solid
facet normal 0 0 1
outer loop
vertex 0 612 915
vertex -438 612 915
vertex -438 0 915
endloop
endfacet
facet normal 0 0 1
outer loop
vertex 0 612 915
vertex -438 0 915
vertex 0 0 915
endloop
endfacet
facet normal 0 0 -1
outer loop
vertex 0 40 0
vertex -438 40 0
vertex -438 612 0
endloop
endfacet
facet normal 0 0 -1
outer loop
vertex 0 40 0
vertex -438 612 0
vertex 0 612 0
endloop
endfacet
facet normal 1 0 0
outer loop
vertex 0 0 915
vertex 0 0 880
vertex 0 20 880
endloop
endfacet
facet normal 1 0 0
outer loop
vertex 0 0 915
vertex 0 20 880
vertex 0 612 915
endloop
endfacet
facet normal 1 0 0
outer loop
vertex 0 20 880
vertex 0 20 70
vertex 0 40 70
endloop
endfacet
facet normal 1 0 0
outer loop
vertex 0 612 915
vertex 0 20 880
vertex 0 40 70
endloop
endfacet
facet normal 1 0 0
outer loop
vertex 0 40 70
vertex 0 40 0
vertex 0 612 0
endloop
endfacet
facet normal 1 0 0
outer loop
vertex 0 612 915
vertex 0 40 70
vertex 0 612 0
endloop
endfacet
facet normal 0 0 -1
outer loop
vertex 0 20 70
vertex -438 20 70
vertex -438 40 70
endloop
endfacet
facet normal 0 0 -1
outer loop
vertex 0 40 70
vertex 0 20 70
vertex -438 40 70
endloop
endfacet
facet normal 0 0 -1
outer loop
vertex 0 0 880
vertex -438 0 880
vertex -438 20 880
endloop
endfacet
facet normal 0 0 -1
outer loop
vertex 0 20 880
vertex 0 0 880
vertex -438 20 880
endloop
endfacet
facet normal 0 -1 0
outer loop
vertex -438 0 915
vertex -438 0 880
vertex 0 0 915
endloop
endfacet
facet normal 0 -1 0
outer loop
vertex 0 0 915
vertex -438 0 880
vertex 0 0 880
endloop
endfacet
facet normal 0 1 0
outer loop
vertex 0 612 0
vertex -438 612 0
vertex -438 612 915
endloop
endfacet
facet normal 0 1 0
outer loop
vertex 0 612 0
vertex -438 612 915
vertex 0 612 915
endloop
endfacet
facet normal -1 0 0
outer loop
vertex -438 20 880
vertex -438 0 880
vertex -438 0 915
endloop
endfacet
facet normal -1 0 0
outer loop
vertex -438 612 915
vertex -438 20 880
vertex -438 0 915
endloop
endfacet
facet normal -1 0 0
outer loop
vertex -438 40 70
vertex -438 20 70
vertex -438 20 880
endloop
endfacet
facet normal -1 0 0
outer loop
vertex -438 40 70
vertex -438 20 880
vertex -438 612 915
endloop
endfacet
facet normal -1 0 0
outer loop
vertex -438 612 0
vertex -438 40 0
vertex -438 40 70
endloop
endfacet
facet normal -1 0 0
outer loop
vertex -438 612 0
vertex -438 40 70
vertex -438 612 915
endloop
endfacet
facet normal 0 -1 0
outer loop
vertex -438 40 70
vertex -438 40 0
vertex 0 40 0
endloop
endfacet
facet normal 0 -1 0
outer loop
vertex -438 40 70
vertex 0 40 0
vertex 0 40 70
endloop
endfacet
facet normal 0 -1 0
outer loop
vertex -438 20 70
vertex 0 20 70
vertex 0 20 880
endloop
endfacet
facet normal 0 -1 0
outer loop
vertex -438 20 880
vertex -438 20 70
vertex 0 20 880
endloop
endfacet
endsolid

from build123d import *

# Parameters (mm, degrees)
F0_W     = 438
F0_H     = 612
F1_DEPTH = 915
F2_W     = 20
F2_H     = 880
F3_DEPTH = 438.001
F4_W     = 20
F4_H     = 70
F5_DEPTH = 438.001


with BuildPart() as f1:
    # F0 (on Top) → F1 (new body)
    with BuildSketch(Plane.XY):
        with Locations((-219, 306)):
            Rectangle(F0_W, F0_H)
    extrude(amount=F1_DEPTH)

    # F2 (on face) → F3 (cut, through all)
    with BuildSketch(Plane.YZ):
        with Locations((10, 440)):
            Rectangle(F2_W, F2_H)
    extrude(amount=-F3_DEPTH, mode=Mode.SUBTRACT)

    # F4 (on face) → F5 (cut, through all)
    with BuildSketch(Plane.YZ):
        with Locations((30, 35)):
            Rectangle(F4_W, F4_H)
    extrude(amount=-F5_DEPTH, mode=Mode.SUBTRACT)


solid = f1.part
